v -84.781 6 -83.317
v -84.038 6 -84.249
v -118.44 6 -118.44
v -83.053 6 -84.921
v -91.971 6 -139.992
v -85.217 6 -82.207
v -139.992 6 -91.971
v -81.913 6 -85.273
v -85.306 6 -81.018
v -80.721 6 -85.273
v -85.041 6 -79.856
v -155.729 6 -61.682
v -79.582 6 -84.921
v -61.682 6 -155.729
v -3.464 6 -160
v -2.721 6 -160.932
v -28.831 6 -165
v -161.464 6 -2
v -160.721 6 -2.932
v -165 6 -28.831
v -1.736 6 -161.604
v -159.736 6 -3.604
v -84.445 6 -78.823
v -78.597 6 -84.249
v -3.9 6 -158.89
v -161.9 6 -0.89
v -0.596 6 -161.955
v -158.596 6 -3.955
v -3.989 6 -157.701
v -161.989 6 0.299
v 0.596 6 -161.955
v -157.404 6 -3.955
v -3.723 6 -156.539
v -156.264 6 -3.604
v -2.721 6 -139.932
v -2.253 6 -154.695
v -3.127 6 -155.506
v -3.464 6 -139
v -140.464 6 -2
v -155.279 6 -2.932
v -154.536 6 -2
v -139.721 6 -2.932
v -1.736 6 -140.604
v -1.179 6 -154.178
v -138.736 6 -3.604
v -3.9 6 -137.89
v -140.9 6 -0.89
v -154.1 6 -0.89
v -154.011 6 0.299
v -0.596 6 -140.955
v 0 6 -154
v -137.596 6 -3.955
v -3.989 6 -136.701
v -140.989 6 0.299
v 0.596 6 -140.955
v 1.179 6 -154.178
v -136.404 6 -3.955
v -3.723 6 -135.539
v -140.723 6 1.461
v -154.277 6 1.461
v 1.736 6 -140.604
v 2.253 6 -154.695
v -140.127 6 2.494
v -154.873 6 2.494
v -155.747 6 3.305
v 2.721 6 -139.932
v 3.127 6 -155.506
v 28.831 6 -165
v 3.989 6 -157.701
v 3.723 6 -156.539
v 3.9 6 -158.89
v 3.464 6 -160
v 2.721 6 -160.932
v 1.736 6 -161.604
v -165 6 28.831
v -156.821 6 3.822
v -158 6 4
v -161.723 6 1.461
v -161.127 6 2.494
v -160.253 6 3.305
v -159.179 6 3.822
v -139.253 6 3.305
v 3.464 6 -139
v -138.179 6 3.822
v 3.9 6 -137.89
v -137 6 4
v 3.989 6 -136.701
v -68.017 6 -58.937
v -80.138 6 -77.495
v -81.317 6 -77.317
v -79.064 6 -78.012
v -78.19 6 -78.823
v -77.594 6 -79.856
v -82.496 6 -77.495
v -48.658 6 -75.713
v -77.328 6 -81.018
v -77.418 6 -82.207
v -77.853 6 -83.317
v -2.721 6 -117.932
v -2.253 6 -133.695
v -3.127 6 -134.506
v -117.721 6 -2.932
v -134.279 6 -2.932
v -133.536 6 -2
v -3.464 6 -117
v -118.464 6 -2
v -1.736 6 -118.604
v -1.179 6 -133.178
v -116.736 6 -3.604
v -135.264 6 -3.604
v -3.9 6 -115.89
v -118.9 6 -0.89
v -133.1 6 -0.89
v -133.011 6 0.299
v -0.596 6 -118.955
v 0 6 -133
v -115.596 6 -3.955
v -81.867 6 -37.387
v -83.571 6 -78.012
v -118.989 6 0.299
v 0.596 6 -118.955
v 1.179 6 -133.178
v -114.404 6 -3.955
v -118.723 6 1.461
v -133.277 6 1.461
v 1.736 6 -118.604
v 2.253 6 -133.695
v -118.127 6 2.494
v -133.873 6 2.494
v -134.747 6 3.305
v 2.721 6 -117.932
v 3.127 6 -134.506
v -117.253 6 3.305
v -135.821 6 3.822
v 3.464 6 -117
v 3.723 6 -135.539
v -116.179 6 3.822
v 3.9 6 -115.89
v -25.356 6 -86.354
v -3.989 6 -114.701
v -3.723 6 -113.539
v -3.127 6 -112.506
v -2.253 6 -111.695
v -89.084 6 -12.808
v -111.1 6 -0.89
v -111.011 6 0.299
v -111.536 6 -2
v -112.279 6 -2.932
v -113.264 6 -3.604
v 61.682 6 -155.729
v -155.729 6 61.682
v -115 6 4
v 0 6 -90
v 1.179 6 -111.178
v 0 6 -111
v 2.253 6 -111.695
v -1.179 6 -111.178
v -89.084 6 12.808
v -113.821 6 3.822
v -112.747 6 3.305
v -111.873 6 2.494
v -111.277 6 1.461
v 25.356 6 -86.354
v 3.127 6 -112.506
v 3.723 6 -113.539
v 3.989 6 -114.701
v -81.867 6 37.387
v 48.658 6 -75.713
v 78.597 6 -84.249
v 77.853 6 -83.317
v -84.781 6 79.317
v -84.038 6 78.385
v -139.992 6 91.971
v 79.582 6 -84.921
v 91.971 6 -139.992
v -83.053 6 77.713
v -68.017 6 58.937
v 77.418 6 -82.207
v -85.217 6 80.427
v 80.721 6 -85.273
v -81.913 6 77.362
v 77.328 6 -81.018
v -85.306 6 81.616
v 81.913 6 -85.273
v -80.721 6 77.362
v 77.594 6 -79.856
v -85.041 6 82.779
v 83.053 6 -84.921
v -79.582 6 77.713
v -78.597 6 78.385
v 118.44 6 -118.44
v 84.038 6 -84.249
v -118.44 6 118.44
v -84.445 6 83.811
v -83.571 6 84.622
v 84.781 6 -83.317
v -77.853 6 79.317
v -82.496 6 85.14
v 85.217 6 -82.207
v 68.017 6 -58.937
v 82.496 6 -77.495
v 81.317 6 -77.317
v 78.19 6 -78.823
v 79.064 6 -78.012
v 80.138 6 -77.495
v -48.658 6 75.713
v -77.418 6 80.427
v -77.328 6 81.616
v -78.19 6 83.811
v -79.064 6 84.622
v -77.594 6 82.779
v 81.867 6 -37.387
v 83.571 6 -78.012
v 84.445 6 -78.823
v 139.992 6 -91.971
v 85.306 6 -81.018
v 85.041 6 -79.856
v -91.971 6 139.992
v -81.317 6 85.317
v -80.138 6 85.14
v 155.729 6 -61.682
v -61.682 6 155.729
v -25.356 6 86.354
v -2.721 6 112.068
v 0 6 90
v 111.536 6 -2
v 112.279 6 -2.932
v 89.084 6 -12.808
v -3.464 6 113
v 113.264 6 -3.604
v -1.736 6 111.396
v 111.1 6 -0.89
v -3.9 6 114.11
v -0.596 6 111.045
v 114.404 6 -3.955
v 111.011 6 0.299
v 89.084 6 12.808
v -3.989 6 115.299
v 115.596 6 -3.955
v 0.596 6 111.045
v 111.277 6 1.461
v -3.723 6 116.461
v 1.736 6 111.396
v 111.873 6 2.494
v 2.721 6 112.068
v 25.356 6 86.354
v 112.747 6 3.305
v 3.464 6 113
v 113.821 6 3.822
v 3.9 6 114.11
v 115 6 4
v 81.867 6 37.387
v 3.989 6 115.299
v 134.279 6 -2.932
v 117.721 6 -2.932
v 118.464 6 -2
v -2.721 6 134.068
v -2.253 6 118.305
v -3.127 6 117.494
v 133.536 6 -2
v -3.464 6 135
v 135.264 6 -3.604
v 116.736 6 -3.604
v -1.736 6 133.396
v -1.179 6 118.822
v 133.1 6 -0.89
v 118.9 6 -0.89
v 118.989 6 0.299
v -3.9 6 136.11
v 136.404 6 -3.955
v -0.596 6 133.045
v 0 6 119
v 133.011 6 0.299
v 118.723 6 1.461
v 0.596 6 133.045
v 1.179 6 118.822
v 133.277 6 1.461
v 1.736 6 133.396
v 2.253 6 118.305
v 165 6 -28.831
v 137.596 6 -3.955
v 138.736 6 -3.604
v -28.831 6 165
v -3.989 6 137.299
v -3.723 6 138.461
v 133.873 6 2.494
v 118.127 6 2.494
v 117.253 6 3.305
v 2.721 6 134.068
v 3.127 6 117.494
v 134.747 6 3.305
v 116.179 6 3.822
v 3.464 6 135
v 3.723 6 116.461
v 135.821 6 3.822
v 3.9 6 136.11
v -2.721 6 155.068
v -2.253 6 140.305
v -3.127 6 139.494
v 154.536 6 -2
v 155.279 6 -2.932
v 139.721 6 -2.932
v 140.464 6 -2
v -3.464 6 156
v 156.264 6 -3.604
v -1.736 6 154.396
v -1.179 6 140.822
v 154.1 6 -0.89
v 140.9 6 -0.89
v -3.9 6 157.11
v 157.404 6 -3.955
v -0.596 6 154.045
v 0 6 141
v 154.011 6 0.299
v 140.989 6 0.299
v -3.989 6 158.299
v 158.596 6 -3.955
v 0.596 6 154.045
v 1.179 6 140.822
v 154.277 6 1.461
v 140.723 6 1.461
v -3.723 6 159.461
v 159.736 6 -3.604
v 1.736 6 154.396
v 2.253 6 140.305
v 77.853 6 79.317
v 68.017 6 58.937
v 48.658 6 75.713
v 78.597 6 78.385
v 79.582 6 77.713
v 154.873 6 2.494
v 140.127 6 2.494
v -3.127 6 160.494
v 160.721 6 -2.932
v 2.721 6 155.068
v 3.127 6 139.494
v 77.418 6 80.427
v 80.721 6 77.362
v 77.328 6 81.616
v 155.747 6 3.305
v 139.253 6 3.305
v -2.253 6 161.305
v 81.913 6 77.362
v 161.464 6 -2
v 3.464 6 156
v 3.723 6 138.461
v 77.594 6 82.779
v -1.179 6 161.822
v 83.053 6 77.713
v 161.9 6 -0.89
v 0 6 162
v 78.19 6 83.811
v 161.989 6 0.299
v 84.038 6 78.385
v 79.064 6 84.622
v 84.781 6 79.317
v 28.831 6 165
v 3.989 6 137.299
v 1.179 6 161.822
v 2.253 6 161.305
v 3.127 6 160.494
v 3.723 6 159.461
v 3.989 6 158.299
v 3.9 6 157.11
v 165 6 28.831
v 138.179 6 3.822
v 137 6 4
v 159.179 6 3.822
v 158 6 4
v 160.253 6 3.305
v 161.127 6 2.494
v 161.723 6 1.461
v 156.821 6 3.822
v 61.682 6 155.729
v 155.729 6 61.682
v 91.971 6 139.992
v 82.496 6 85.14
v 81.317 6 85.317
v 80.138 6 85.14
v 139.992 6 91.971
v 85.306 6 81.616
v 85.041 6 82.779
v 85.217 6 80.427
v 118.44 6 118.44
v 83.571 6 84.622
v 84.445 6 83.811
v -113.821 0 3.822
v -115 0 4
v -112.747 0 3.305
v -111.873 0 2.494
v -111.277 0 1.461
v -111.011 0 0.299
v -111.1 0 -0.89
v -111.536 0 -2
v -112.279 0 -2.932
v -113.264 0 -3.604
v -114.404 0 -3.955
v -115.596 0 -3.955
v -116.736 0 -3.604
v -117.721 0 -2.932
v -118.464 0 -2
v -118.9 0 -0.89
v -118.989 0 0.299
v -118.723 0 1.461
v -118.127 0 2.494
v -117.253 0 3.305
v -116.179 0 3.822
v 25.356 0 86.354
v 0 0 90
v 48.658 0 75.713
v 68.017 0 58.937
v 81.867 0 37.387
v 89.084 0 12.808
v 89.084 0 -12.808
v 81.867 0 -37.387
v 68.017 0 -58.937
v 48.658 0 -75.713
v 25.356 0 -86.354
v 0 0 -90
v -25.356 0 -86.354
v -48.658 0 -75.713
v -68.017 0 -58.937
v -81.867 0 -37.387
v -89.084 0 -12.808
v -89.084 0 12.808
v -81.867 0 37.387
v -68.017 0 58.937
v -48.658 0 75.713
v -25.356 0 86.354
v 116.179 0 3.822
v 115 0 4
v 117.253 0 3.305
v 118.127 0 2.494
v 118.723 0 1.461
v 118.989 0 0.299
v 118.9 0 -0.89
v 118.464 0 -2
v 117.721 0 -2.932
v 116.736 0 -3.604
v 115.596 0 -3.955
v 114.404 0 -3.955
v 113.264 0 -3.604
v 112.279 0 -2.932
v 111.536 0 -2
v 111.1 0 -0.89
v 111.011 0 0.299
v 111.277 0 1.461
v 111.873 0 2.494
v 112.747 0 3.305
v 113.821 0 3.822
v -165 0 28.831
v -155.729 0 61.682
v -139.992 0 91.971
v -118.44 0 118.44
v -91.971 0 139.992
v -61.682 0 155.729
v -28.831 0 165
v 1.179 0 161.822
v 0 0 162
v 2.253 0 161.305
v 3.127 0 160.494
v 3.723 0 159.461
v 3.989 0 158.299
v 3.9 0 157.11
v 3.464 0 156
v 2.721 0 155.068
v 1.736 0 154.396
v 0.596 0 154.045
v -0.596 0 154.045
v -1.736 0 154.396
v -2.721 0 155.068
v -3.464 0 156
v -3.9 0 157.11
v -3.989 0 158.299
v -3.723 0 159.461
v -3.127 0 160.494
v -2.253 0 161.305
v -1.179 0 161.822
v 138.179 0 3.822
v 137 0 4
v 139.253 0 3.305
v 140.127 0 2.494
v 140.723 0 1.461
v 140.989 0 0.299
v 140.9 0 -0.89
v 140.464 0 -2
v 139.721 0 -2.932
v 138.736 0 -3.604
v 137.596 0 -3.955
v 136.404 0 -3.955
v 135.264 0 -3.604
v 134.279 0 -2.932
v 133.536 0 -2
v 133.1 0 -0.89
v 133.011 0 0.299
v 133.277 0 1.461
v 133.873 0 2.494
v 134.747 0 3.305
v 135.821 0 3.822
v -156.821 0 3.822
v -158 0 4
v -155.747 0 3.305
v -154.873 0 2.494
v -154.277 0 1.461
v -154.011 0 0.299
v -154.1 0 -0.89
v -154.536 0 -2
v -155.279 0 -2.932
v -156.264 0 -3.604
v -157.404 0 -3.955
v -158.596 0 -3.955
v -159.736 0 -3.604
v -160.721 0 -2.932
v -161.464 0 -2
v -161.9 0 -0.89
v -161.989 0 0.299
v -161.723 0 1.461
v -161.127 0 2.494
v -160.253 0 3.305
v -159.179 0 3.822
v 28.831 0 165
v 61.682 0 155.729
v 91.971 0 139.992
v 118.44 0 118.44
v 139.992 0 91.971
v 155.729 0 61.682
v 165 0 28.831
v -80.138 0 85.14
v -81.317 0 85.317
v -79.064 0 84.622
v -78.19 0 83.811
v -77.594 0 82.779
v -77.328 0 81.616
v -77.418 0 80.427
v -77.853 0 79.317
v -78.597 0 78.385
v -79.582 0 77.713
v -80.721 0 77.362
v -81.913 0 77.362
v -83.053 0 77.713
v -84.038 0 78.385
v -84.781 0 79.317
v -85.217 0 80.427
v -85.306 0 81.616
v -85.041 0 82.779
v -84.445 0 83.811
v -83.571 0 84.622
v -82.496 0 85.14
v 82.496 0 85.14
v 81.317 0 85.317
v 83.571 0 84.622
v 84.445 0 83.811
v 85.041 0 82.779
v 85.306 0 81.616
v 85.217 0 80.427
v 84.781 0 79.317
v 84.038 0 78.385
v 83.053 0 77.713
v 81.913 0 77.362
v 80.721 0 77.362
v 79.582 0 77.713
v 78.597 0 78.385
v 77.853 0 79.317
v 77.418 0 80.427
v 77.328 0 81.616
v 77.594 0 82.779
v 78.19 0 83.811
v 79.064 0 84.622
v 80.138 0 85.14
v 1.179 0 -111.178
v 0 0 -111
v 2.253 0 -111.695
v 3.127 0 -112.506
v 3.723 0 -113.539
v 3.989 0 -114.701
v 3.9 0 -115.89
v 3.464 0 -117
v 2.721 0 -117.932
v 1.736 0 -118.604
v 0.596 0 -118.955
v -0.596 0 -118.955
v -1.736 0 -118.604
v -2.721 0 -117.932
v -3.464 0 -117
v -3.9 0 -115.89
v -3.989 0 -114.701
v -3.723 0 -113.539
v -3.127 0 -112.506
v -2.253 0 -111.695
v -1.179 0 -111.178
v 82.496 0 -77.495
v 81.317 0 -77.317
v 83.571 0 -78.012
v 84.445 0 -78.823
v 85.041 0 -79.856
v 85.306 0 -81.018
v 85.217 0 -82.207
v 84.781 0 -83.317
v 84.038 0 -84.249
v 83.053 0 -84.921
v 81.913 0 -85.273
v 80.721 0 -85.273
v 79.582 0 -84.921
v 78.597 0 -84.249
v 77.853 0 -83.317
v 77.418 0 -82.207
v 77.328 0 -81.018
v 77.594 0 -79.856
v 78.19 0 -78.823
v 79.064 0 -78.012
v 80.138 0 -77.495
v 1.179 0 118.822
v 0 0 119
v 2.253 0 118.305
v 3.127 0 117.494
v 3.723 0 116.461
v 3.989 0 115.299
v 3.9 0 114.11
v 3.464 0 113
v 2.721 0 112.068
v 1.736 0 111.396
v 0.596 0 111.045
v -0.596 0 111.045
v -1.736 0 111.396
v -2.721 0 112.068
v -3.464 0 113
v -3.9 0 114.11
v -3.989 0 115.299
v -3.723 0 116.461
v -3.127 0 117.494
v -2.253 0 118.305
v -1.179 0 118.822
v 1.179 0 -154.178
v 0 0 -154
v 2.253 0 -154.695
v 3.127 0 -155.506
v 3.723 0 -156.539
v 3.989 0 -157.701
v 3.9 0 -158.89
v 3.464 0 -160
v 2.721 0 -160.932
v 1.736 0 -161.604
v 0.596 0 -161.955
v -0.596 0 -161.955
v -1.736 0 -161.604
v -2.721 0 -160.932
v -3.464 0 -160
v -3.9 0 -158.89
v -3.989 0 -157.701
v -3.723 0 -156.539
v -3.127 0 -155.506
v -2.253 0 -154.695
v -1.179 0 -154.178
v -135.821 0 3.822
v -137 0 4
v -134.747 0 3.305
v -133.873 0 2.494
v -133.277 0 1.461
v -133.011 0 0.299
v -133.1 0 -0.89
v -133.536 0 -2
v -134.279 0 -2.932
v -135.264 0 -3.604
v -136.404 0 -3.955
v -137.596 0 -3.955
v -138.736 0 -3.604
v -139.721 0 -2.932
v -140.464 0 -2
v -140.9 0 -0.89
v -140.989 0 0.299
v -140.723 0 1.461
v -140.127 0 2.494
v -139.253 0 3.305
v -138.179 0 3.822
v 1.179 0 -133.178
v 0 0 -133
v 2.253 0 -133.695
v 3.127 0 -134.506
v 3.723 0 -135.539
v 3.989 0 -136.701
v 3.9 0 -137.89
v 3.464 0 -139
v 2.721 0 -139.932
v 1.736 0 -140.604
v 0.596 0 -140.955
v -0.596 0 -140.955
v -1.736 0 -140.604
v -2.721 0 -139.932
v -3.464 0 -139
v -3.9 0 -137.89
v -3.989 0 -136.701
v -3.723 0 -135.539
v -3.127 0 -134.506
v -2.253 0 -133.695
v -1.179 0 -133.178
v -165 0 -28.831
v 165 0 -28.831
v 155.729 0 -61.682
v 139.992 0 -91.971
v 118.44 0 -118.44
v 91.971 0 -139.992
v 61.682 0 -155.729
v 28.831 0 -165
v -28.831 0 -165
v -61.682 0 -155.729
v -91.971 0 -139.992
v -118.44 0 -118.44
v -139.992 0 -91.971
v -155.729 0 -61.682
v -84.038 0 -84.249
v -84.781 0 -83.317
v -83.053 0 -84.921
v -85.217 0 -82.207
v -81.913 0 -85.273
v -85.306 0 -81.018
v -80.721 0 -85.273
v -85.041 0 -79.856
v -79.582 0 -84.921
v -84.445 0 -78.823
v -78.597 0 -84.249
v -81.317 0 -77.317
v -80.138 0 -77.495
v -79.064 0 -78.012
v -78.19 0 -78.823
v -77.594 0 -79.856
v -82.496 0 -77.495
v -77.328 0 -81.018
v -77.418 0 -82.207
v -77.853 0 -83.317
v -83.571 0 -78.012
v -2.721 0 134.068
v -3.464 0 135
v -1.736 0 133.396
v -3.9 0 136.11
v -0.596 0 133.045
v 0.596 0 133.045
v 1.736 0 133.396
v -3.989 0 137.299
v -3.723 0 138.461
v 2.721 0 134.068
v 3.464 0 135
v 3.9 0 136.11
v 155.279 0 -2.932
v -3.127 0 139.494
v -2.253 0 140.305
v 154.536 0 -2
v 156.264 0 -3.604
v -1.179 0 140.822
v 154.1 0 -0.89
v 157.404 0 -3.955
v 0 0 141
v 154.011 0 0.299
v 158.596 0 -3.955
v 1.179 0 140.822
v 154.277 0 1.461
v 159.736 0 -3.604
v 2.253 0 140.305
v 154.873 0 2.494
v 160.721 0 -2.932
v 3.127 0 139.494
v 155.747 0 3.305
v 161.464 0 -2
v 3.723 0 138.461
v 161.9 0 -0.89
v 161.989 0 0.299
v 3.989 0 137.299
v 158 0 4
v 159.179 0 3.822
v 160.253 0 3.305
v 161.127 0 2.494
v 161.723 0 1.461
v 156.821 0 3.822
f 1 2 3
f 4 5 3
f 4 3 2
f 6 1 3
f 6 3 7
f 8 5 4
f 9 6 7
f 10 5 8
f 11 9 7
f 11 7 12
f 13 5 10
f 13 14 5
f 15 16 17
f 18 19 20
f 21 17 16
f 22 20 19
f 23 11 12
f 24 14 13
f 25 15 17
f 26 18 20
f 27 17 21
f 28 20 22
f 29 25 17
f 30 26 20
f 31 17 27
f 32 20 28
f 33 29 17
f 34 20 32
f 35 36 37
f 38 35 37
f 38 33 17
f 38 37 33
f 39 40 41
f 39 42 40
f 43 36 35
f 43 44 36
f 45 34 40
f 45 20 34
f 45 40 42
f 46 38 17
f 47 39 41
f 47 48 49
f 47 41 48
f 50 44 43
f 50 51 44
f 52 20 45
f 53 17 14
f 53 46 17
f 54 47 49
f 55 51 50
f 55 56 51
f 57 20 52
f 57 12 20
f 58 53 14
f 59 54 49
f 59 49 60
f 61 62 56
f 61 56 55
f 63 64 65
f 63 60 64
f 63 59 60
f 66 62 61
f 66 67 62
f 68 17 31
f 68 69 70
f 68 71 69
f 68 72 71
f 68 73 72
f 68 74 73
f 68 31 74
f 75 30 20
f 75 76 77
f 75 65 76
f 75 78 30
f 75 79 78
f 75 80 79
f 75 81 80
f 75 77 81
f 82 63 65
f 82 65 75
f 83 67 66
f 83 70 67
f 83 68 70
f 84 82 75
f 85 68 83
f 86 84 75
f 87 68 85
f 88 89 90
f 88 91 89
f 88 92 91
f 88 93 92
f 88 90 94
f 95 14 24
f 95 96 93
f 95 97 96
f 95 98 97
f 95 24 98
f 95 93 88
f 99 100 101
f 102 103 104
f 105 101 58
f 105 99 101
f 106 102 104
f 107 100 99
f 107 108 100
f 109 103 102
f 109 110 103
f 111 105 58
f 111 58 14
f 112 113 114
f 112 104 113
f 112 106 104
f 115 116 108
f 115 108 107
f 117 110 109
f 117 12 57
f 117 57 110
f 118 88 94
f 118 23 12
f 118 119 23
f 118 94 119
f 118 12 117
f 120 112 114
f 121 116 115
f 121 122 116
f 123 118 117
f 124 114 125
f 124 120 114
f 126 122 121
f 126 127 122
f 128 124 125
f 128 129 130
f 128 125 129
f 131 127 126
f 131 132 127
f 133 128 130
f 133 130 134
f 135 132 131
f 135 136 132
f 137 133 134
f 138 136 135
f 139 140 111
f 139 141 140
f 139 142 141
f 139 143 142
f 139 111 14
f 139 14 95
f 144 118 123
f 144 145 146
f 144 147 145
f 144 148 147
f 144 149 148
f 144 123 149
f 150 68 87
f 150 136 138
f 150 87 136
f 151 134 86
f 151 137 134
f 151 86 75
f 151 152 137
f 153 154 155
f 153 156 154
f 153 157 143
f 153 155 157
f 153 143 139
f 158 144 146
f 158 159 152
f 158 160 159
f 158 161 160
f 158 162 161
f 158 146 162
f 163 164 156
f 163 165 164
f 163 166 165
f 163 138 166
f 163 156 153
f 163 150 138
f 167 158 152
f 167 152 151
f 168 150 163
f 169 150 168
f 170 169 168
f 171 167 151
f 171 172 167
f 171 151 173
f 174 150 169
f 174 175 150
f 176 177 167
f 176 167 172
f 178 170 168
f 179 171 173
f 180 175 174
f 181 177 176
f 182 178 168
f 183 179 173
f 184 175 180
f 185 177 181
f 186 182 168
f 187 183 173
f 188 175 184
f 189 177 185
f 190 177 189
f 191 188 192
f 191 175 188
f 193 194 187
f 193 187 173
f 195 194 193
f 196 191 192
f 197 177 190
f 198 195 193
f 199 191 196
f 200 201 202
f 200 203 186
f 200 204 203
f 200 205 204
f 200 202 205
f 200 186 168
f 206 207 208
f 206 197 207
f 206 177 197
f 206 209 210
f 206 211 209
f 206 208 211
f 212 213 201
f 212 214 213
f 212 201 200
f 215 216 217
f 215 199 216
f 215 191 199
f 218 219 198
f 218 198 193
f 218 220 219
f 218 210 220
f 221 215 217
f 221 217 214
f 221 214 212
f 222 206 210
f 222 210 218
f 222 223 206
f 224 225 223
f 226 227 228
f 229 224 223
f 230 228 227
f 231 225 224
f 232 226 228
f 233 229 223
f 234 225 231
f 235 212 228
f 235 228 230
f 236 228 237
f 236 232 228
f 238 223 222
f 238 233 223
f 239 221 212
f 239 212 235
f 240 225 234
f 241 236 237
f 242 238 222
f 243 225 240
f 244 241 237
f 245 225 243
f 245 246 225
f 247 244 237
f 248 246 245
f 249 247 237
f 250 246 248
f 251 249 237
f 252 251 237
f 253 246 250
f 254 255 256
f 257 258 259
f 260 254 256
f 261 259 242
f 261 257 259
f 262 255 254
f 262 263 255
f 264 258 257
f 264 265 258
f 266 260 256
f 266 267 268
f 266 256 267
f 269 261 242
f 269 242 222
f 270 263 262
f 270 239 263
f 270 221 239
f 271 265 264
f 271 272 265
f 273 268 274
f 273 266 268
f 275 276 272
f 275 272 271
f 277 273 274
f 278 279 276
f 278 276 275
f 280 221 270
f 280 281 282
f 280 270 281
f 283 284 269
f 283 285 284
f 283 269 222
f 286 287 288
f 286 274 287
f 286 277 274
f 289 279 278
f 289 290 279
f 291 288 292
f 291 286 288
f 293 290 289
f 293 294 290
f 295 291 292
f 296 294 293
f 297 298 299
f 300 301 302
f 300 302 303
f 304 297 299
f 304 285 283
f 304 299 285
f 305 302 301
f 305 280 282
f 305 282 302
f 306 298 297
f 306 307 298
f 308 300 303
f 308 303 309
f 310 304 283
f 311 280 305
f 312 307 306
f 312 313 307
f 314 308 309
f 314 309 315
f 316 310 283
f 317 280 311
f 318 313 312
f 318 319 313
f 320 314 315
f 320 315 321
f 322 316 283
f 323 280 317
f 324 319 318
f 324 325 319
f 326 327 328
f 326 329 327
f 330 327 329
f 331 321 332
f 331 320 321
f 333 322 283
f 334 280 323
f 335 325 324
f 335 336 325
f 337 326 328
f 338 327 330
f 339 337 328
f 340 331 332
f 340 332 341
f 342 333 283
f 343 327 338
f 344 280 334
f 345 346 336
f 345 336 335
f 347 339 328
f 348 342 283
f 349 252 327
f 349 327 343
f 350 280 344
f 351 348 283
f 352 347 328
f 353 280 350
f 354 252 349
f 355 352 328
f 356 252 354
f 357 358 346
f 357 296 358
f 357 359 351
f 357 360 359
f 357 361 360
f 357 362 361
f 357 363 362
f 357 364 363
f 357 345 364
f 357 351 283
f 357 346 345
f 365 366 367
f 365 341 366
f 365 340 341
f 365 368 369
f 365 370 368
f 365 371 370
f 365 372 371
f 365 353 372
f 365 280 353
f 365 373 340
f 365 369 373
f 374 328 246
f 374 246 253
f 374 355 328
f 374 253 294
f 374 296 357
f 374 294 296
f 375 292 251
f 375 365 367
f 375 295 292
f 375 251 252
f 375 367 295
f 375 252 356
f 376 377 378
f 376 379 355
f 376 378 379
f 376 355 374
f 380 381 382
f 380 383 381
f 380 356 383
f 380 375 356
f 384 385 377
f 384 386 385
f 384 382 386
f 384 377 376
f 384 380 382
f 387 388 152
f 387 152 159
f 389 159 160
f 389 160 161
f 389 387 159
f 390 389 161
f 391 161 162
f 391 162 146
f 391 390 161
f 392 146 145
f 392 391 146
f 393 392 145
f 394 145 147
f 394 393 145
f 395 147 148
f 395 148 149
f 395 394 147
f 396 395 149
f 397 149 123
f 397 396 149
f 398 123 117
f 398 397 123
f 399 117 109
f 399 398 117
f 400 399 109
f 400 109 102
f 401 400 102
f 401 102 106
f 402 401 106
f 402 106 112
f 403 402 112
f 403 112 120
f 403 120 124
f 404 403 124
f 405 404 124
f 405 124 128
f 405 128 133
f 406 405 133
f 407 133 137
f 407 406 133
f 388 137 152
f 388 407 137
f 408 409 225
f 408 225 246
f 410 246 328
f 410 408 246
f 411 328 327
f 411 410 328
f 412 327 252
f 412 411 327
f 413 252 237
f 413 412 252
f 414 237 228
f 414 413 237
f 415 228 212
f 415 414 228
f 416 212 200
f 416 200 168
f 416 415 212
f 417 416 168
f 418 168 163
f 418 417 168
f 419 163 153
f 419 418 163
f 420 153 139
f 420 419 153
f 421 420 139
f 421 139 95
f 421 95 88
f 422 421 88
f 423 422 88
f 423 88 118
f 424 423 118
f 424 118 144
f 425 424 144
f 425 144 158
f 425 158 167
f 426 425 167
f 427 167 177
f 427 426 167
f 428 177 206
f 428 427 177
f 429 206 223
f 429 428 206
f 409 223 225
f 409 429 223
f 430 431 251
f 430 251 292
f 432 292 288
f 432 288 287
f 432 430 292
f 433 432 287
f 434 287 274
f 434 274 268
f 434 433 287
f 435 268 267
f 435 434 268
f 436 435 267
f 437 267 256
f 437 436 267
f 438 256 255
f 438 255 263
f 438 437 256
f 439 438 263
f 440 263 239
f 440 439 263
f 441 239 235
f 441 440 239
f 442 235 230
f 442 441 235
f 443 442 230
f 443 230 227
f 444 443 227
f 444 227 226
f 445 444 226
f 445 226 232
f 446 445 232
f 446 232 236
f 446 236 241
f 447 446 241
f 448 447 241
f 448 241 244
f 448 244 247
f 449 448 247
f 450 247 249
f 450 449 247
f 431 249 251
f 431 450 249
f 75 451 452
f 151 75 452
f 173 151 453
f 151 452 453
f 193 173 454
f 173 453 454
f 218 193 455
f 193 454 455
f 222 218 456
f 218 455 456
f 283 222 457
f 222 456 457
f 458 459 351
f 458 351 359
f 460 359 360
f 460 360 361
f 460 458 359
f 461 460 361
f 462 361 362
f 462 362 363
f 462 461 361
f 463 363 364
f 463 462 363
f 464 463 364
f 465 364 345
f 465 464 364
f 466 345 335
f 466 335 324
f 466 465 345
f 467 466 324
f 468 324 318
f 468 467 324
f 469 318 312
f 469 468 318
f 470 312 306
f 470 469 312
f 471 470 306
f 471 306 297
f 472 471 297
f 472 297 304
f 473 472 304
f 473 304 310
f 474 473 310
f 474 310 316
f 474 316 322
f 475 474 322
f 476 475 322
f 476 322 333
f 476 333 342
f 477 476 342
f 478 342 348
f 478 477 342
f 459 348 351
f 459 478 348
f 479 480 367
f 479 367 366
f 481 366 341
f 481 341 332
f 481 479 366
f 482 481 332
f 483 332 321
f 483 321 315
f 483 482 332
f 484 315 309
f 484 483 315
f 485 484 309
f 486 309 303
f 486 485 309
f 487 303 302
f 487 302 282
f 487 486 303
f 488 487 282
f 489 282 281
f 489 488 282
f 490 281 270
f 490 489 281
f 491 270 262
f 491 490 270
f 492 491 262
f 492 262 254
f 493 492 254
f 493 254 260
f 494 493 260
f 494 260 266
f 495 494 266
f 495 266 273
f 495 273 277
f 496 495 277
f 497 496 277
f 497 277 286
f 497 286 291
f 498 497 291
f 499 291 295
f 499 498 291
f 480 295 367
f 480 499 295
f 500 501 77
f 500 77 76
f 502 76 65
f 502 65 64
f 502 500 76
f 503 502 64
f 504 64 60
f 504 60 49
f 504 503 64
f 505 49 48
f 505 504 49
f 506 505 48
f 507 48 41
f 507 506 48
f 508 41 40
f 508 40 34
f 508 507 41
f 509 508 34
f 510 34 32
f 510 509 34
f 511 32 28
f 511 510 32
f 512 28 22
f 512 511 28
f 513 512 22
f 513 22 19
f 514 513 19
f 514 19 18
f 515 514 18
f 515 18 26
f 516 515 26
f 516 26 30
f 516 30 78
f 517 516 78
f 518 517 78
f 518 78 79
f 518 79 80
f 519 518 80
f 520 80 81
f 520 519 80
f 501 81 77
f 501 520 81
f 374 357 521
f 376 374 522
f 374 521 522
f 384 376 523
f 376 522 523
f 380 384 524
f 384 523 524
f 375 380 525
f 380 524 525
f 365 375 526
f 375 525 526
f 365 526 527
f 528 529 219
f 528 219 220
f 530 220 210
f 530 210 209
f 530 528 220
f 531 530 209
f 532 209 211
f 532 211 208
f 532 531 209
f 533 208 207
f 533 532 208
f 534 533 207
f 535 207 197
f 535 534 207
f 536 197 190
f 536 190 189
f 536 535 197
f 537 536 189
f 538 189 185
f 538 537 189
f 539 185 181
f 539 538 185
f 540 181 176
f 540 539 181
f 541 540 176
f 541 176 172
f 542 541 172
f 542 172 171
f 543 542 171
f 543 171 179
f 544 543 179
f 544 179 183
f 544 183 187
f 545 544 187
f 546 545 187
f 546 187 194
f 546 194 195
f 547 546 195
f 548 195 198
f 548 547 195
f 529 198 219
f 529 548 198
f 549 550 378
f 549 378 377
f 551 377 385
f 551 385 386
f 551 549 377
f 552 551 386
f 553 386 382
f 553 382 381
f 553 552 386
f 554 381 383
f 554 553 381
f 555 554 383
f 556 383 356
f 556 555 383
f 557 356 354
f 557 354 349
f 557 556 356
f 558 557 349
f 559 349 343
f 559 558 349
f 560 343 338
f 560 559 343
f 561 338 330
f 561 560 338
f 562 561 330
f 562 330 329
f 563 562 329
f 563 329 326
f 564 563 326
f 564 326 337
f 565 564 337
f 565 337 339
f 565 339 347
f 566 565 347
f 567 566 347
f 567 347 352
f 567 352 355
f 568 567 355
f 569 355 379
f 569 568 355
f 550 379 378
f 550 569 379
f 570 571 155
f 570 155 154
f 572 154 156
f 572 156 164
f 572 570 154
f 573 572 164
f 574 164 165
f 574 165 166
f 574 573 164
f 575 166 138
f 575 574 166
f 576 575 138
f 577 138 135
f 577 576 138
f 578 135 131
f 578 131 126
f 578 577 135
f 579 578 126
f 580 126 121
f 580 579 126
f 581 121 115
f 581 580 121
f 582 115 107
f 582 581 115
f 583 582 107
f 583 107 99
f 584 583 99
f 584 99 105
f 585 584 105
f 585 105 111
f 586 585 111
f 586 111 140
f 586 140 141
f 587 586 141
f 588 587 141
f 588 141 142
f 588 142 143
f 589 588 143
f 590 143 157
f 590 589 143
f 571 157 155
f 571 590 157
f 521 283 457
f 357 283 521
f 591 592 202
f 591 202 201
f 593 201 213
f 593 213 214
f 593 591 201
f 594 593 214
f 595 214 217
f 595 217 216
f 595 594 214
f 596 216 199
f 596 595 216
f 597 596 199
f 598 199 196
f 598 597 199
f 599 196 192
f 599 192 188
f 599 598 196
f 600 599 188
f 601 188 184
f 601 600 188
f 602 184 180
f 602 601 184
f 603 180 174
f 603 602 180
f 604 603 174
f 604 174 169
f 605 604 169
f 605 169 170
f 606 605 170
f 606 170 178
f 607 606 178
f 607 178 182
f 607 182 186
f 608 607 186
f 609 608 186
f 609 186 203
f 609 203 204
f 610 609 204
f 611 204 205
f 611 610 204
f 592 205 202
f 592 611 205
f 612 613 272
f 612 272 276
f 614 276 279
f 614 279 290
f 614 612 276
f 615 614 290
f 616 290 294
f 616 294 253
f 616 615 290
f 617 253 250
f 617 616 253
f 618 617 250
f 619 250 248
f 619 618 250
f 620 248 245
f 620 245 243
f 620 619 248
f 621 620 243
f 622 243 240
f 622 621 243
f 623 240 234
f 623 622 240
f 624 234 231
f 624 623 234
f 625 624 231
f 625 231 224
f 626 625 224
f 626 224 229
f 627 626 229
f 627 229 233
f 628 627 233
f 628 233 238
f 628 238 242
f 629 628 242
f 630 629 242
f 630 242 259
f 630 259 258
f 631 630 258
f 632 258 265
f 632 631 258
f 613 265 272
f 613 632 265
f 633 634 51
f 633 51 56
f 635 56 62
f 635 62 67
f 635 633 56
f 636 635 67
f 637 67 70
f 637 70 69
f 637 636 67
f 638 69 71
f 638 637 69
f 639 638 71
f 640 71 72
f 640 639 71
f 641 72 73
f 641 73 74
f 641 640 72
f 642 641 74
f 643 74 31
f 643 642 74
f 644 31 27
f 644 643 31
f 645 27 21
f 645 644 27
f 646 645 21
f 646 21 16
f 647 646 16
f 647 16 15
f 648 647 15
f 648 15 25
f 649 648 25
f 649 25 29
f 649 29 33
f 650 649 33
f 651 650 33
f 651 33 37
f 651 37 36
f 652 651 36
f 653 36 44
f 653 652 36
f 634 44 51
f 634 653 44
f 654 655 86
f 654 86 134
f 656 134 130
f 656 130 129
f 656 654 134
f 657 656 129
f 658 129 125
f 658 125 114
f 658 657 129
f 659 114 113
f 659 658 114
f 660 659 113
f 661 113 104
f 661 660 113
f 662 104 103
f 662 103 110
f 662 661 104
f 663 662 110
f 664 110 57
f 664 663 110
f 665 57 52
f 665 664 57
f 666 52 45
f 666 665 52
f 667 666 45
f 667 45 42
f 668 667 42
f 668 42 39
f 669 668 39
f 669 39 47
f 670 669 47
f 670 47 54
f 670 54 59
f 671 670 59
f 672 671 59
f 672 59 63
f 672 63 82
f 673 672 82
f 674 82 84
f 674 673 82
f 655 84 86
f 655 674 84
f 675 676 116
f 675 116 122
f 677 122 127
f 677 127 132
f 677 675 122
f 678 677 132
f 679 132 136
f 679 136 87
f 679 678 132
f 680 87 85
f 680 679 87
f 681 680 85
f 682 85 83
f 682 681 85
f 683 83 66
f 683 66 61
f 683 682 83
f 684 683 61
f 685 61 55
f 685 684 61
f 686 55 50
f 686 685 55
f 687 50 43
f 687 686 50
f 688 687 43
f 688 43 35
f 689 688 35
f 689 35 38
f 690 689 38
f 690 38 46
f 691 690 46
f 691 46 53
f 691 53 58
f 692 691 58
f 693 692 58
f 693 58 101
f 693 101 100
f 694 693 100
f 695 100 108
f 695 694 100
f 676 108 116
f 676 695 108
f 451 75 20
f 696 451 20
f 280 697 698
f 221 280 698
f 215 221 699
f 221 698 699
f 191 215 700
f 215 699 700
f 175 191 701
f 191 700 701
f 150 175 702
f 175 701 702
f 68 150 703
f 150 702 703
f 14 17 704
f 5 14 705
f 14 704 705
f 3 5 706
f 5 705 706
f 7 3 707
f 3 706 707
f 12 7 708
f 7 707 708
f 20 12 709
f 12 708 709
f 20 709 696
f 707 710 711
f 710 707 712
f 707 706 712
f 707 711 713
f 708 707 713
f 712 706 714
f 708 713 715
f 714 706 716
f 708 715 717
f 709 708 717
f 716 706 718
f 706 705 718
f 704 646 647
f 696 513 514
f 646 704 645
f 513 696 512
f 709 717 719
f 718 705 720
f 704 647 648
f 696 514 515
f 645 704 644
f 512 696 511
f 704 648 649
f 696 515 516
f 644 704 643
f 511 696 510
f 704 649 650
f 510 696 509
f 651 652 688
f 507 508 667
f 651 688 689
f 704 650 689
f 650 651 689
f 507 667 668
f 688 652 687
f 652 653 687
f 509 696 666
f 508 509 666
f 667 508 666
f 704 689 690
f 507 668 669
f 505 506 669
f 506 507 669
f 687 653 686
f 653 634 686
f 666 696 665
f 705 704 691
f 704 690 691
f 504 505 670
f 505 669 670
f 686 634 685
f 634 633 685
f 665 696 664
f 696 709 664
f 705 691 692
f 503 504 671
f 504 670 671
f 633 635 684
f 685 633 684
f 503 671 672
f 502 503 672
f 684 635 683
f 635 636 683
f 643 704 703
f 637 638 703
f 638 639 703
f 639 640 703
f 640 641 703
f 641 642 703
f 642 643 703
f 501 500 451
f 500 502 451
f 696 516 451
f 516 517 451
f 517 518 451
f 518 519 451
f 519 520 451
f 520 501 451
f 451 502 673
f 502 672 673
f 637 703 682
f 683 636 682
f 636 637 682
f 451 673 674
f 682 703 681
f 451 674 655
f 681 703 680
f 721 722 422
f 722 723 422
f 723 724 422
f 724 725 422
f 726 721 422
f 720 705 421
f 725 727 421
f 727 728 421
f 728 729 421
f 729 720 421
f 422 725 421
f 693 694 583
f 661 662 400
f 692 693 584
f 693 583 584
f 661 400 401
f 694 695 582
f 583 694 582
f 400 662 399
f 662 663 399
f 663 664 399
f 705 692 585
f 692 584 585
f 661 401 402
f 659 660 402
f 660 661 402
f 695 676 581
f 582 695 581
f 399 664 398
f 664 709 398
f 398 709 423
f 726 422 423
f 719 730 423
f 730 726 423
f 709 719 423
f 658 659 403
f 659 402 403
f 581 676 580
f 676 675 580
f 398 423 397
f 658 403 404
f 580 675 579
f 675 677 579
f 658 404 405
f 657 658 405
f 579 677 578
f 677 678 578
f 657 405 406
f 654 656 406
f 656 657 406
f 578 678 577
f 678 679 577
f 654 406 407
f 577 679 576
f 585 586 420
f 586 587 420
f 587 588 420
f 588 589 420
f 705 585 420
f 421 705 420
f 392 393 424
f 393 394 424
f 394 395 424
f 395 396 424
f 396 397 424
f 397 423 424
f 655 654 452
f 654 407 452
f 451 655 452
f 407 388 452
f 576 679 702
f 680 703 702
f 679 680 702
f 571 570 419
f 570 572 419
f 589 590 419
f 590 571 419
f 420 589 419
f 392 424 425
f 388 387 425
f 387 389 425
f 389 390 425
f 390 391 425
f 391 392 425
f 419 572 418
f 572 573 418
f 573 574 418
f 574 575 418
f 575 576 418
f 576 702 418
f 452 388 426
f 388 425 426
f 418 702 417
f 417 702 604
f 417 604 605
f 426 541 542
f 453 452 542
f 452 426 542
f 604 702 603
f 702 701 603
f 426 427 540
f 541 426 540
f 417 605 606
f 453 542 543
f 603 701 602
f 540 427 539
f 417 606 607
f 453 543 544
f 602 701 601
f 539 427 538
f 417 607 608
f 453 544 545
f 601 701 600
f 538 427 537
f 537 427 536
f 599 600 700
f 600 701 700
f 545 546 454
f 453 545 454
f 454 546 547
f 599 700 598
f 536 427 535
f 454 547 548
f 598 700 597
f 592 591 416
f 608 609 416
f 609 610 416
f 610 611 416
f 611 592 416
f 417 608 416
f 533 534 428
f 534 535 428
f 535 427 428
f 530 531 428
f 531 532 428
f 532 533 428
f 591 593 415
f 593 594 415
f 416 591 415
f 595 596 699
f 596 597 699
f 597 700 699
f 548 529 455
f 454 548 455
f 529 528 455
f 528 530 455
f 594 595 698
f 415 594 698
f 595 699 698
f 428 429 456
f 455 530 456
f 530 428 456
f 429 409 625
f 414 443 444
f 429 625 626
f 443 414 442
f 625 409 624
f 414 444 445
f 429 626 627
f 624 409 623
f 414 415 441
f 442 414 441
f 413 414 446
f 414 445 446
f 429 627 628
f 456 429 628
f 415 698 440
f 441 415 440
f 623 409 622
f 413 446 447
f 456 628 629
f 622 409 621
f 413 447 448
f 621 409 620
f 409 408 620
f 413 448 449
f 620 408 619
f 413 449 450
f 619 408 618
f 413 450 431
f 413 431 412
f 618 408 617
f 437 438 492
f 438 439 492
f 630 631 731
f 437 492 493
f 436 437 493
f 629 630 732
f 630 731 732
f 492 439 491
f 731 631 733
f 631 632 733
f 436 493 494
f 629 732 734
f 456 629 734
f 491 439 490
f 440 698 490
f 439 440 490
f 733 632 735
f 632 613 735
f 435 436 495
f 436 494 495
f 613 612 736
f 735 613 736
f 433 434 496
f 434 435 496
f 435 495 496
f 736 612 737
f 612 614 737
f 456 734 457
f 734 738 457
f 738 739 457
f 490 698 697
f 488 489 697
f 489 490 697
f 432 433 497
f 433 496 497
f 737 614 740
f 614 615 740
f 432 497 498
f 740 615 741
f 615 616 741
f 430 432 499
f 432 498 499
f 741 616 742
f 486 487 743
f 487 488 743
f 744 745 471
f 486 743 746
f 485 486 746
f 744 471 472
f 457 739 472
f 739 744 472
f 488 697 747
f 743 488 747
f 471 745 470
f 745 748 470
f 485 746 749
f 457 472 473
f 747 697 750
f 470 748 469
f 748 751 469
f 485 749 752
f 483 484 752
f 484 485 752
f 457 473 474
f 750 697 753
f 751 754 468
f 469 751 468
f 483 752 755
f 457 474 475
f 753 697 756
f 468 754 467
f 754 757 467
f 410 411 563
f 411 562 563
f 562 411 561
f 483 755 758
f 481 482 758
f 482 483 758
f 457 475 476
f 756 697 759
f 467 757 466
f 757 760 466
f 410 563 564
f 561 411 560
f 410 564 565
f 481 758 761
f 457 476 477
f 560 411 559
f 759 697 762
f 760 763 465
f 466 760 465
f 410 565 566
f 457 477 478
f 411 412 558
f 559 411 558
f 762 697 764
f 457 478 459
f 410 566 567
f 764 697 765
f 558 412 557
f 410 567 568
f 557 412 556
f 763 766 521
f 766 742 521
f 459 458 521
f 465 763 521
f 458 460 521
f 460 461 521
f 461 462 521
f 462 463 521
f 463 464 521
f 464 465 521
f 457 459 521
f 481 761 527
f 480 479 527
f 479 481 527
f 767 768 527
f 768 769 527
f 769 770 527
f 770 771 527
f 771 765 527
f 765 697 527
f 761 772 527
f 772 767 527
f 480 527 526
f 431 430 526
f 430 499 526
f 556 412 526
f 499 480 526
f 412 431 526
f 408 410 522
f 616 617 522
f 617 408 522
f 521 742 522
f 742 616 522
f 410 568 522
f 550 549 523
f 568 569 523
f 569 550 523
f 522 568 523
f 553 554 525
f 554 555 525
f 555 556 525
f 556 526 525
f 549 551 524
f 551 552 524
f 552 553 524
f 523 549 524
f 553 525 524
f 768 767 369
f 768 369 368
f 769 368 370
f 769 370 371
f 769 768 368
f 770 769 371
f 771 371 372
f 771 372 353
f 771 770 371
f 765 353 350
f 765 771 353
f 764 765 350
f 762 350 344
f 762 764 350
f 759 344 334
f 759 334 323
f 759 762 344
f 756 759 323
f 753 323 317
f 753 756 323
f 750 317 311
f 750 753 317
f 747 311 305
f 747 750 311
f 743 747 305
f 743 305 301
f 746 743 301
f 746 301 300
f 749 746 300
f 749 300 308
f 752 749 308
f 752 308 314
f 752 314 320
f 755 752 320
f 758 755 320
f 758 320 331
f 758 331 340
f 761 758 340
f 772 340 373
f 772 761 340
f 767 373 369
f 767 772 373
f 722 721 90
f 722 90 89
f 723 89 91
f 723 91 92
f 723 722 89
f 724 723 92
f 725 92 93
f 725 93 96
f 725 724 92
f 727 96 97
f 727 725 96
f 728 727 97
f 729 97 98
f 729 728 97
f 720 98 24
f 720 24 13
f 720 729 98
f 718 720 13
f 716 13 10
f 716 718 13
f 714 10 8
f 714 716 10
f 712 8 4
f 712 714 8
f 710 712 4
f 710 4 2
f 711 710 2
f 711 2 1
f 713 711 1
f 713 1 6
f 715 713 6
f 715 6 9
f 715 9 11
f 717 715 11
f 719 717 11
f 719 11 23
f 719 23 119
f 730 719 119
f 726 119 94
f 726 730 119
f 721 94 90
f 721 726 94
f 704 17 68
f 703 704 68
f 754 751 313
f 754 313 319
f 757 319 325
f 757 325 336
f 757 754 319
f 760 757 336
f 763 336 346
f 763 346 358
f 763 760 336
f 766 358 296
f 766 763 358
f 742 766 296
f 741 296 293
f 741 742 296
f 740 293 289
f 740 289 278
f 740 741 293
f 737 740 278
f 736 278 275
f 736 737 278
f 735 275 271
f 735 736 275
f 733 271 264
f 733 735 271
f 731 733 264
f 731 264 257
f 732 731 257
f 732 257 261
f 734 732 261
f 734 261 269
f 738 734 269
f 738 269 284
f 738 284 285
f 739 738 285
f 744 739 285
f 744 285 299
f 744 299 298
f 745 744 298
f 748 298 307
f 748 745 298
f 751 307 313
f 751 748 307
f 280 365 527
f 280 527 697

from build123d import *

# Parameters (mm, degrees)
SKETCH1_R           = 167.5
SKETCH1_R_2         = 4
SKETCH1_R_3         = 90
BOSS_EXTRUDE1_DEPTH = 6
SKETCH4_OUTSIDE_W   = 431.76
SKETCH4_OUTSIDE_H   = 431.76
SKETCH4_OUTSIDE_W_2 = 330
SKETCH4_OUTSIDE_H_2 = 330
CUT_EXTRUDE3_DEPTH  = 10


with BuildPart() as part:
    # Sketch1 → Boss-Extrude1 (new body)
    with BuildSketch(Plane(origin=(0, 0, 0), x_dir=(1, 0, 0), z_dir=(0, 1, 0))):
        with Locations(Location((0, 0, 0), (0, 0, 270))):
            Circle(SKETCH1_R)
        with Locations(Location((0, 115, 0), (0, 0, 270))):
            Circle(SKETCH1_R_2, mode=Mode.SUBTRACT)
        with Locations(Location((0, 0, 0), (0, 0, 270))):
            Circle(SKETCH1_R_3, mode=Mode.SUBTRACT)
        with Locations(Location((-137, 0, 0), (0, 0, 270))):
            Circle(SKETCH1_R_2, mode=Mode.SUBTRACT)
        with Locations(Location((-158, 0, 0), (0, 0, 270))):
            Circle(SKETCH1_R_2, mode=Mode.SUBTRACT)
        with Locations(Location((0, -158, 0), (0, 0, 270))):
            Circle(SKETCH1_R_2, mode=Mode.SUBTRACT)
        with Locations(Location((0, -137, 0), (0, 0, 270))):
            Circle(SKETCH1_R_2, mode=Mode.SUBTRACT)
        with Locations(Location((81.317279836, 81.317279836, 0), (0, 0, 270))):
            Circle(SKETCH1_R_2, mode=Mode.SUBTRACT)
        with Locations(Location((115, 0, 0), (0, 0, 270))):
            Circle(SKETCH1_R_2, mode=Mode.SUBTRACT)
        with Locations(Location((81.317279836, -81.317279836, 0), (0, 0, 270))):
            Circle(SKETCH1_R_2, mode=Mode.SUBTRACT)
        with Locations(Location((0, -115, 0), (0, 0, 270))):
            Circle(SKETCH1_R_2, mode=Mode.SUBTRACT)
        with Locations(Location((-81.317279836, -81.317279836, 0), (0, 0, 270))):
            Circle(SKETCH1_R_2, mode=Mode.SUBTRACT)
        with Locations(Location((-115, 0, 0), (0, 0, 270))):
            Circle(SKETCH1_R_2, mode=Mode.SUBTRACT)
        with Locations(Location((-81.317279836, 81.317279836, 0), (0, 0, 270))):
            Circle(SKETCH1_R_2, mode=Mode.SUBTRACT)
        with Locations(Location((0, 137, 0), (0, 0, 270))):
            Circle(SKETCH1_R_2, mode=Mode.SUBTRACT)
        with Locations(Location((0, 158, 0), (0, 0, 270))):
            Circle(SKETCH1_R_2, mode=Mode.SUBTRACT)
        with Locations(Location((137, 0, 0), (0, 0, 270))):
            Circle(SKETCH1_R_2, mode=Mode.SUBTRACT)
        with Locations(Location((158, 0, 0), (0, 0, 270))):
            Circle(SKETCH1_R_2, mode=Mode.SUBTRACT)
    extrude(amount=BOSS_EXTRUDE1_DEPTH)

    # Sketch4 outside → Cut-Extrude3 (cut)
    with BuildSketch(Plane(origin=(0, 6, 0), x_dir=(1, 0, 0), z_dir=(0, 1, 0))):
        Rectangle(SKETCH4_OUTSIDE_W, SKETCH4_OUTSIDE_H)
        Rectangle(SKETCH4_OUTSIDE_W_2, SKETCH4_OUTSIDE_H_2, mode=Mode.SUBTRACT)
    extrude(amount=-CUT_EXTRUDE3_DEPTH, mode=Mode.SUBTRACT)


solid = part.part
